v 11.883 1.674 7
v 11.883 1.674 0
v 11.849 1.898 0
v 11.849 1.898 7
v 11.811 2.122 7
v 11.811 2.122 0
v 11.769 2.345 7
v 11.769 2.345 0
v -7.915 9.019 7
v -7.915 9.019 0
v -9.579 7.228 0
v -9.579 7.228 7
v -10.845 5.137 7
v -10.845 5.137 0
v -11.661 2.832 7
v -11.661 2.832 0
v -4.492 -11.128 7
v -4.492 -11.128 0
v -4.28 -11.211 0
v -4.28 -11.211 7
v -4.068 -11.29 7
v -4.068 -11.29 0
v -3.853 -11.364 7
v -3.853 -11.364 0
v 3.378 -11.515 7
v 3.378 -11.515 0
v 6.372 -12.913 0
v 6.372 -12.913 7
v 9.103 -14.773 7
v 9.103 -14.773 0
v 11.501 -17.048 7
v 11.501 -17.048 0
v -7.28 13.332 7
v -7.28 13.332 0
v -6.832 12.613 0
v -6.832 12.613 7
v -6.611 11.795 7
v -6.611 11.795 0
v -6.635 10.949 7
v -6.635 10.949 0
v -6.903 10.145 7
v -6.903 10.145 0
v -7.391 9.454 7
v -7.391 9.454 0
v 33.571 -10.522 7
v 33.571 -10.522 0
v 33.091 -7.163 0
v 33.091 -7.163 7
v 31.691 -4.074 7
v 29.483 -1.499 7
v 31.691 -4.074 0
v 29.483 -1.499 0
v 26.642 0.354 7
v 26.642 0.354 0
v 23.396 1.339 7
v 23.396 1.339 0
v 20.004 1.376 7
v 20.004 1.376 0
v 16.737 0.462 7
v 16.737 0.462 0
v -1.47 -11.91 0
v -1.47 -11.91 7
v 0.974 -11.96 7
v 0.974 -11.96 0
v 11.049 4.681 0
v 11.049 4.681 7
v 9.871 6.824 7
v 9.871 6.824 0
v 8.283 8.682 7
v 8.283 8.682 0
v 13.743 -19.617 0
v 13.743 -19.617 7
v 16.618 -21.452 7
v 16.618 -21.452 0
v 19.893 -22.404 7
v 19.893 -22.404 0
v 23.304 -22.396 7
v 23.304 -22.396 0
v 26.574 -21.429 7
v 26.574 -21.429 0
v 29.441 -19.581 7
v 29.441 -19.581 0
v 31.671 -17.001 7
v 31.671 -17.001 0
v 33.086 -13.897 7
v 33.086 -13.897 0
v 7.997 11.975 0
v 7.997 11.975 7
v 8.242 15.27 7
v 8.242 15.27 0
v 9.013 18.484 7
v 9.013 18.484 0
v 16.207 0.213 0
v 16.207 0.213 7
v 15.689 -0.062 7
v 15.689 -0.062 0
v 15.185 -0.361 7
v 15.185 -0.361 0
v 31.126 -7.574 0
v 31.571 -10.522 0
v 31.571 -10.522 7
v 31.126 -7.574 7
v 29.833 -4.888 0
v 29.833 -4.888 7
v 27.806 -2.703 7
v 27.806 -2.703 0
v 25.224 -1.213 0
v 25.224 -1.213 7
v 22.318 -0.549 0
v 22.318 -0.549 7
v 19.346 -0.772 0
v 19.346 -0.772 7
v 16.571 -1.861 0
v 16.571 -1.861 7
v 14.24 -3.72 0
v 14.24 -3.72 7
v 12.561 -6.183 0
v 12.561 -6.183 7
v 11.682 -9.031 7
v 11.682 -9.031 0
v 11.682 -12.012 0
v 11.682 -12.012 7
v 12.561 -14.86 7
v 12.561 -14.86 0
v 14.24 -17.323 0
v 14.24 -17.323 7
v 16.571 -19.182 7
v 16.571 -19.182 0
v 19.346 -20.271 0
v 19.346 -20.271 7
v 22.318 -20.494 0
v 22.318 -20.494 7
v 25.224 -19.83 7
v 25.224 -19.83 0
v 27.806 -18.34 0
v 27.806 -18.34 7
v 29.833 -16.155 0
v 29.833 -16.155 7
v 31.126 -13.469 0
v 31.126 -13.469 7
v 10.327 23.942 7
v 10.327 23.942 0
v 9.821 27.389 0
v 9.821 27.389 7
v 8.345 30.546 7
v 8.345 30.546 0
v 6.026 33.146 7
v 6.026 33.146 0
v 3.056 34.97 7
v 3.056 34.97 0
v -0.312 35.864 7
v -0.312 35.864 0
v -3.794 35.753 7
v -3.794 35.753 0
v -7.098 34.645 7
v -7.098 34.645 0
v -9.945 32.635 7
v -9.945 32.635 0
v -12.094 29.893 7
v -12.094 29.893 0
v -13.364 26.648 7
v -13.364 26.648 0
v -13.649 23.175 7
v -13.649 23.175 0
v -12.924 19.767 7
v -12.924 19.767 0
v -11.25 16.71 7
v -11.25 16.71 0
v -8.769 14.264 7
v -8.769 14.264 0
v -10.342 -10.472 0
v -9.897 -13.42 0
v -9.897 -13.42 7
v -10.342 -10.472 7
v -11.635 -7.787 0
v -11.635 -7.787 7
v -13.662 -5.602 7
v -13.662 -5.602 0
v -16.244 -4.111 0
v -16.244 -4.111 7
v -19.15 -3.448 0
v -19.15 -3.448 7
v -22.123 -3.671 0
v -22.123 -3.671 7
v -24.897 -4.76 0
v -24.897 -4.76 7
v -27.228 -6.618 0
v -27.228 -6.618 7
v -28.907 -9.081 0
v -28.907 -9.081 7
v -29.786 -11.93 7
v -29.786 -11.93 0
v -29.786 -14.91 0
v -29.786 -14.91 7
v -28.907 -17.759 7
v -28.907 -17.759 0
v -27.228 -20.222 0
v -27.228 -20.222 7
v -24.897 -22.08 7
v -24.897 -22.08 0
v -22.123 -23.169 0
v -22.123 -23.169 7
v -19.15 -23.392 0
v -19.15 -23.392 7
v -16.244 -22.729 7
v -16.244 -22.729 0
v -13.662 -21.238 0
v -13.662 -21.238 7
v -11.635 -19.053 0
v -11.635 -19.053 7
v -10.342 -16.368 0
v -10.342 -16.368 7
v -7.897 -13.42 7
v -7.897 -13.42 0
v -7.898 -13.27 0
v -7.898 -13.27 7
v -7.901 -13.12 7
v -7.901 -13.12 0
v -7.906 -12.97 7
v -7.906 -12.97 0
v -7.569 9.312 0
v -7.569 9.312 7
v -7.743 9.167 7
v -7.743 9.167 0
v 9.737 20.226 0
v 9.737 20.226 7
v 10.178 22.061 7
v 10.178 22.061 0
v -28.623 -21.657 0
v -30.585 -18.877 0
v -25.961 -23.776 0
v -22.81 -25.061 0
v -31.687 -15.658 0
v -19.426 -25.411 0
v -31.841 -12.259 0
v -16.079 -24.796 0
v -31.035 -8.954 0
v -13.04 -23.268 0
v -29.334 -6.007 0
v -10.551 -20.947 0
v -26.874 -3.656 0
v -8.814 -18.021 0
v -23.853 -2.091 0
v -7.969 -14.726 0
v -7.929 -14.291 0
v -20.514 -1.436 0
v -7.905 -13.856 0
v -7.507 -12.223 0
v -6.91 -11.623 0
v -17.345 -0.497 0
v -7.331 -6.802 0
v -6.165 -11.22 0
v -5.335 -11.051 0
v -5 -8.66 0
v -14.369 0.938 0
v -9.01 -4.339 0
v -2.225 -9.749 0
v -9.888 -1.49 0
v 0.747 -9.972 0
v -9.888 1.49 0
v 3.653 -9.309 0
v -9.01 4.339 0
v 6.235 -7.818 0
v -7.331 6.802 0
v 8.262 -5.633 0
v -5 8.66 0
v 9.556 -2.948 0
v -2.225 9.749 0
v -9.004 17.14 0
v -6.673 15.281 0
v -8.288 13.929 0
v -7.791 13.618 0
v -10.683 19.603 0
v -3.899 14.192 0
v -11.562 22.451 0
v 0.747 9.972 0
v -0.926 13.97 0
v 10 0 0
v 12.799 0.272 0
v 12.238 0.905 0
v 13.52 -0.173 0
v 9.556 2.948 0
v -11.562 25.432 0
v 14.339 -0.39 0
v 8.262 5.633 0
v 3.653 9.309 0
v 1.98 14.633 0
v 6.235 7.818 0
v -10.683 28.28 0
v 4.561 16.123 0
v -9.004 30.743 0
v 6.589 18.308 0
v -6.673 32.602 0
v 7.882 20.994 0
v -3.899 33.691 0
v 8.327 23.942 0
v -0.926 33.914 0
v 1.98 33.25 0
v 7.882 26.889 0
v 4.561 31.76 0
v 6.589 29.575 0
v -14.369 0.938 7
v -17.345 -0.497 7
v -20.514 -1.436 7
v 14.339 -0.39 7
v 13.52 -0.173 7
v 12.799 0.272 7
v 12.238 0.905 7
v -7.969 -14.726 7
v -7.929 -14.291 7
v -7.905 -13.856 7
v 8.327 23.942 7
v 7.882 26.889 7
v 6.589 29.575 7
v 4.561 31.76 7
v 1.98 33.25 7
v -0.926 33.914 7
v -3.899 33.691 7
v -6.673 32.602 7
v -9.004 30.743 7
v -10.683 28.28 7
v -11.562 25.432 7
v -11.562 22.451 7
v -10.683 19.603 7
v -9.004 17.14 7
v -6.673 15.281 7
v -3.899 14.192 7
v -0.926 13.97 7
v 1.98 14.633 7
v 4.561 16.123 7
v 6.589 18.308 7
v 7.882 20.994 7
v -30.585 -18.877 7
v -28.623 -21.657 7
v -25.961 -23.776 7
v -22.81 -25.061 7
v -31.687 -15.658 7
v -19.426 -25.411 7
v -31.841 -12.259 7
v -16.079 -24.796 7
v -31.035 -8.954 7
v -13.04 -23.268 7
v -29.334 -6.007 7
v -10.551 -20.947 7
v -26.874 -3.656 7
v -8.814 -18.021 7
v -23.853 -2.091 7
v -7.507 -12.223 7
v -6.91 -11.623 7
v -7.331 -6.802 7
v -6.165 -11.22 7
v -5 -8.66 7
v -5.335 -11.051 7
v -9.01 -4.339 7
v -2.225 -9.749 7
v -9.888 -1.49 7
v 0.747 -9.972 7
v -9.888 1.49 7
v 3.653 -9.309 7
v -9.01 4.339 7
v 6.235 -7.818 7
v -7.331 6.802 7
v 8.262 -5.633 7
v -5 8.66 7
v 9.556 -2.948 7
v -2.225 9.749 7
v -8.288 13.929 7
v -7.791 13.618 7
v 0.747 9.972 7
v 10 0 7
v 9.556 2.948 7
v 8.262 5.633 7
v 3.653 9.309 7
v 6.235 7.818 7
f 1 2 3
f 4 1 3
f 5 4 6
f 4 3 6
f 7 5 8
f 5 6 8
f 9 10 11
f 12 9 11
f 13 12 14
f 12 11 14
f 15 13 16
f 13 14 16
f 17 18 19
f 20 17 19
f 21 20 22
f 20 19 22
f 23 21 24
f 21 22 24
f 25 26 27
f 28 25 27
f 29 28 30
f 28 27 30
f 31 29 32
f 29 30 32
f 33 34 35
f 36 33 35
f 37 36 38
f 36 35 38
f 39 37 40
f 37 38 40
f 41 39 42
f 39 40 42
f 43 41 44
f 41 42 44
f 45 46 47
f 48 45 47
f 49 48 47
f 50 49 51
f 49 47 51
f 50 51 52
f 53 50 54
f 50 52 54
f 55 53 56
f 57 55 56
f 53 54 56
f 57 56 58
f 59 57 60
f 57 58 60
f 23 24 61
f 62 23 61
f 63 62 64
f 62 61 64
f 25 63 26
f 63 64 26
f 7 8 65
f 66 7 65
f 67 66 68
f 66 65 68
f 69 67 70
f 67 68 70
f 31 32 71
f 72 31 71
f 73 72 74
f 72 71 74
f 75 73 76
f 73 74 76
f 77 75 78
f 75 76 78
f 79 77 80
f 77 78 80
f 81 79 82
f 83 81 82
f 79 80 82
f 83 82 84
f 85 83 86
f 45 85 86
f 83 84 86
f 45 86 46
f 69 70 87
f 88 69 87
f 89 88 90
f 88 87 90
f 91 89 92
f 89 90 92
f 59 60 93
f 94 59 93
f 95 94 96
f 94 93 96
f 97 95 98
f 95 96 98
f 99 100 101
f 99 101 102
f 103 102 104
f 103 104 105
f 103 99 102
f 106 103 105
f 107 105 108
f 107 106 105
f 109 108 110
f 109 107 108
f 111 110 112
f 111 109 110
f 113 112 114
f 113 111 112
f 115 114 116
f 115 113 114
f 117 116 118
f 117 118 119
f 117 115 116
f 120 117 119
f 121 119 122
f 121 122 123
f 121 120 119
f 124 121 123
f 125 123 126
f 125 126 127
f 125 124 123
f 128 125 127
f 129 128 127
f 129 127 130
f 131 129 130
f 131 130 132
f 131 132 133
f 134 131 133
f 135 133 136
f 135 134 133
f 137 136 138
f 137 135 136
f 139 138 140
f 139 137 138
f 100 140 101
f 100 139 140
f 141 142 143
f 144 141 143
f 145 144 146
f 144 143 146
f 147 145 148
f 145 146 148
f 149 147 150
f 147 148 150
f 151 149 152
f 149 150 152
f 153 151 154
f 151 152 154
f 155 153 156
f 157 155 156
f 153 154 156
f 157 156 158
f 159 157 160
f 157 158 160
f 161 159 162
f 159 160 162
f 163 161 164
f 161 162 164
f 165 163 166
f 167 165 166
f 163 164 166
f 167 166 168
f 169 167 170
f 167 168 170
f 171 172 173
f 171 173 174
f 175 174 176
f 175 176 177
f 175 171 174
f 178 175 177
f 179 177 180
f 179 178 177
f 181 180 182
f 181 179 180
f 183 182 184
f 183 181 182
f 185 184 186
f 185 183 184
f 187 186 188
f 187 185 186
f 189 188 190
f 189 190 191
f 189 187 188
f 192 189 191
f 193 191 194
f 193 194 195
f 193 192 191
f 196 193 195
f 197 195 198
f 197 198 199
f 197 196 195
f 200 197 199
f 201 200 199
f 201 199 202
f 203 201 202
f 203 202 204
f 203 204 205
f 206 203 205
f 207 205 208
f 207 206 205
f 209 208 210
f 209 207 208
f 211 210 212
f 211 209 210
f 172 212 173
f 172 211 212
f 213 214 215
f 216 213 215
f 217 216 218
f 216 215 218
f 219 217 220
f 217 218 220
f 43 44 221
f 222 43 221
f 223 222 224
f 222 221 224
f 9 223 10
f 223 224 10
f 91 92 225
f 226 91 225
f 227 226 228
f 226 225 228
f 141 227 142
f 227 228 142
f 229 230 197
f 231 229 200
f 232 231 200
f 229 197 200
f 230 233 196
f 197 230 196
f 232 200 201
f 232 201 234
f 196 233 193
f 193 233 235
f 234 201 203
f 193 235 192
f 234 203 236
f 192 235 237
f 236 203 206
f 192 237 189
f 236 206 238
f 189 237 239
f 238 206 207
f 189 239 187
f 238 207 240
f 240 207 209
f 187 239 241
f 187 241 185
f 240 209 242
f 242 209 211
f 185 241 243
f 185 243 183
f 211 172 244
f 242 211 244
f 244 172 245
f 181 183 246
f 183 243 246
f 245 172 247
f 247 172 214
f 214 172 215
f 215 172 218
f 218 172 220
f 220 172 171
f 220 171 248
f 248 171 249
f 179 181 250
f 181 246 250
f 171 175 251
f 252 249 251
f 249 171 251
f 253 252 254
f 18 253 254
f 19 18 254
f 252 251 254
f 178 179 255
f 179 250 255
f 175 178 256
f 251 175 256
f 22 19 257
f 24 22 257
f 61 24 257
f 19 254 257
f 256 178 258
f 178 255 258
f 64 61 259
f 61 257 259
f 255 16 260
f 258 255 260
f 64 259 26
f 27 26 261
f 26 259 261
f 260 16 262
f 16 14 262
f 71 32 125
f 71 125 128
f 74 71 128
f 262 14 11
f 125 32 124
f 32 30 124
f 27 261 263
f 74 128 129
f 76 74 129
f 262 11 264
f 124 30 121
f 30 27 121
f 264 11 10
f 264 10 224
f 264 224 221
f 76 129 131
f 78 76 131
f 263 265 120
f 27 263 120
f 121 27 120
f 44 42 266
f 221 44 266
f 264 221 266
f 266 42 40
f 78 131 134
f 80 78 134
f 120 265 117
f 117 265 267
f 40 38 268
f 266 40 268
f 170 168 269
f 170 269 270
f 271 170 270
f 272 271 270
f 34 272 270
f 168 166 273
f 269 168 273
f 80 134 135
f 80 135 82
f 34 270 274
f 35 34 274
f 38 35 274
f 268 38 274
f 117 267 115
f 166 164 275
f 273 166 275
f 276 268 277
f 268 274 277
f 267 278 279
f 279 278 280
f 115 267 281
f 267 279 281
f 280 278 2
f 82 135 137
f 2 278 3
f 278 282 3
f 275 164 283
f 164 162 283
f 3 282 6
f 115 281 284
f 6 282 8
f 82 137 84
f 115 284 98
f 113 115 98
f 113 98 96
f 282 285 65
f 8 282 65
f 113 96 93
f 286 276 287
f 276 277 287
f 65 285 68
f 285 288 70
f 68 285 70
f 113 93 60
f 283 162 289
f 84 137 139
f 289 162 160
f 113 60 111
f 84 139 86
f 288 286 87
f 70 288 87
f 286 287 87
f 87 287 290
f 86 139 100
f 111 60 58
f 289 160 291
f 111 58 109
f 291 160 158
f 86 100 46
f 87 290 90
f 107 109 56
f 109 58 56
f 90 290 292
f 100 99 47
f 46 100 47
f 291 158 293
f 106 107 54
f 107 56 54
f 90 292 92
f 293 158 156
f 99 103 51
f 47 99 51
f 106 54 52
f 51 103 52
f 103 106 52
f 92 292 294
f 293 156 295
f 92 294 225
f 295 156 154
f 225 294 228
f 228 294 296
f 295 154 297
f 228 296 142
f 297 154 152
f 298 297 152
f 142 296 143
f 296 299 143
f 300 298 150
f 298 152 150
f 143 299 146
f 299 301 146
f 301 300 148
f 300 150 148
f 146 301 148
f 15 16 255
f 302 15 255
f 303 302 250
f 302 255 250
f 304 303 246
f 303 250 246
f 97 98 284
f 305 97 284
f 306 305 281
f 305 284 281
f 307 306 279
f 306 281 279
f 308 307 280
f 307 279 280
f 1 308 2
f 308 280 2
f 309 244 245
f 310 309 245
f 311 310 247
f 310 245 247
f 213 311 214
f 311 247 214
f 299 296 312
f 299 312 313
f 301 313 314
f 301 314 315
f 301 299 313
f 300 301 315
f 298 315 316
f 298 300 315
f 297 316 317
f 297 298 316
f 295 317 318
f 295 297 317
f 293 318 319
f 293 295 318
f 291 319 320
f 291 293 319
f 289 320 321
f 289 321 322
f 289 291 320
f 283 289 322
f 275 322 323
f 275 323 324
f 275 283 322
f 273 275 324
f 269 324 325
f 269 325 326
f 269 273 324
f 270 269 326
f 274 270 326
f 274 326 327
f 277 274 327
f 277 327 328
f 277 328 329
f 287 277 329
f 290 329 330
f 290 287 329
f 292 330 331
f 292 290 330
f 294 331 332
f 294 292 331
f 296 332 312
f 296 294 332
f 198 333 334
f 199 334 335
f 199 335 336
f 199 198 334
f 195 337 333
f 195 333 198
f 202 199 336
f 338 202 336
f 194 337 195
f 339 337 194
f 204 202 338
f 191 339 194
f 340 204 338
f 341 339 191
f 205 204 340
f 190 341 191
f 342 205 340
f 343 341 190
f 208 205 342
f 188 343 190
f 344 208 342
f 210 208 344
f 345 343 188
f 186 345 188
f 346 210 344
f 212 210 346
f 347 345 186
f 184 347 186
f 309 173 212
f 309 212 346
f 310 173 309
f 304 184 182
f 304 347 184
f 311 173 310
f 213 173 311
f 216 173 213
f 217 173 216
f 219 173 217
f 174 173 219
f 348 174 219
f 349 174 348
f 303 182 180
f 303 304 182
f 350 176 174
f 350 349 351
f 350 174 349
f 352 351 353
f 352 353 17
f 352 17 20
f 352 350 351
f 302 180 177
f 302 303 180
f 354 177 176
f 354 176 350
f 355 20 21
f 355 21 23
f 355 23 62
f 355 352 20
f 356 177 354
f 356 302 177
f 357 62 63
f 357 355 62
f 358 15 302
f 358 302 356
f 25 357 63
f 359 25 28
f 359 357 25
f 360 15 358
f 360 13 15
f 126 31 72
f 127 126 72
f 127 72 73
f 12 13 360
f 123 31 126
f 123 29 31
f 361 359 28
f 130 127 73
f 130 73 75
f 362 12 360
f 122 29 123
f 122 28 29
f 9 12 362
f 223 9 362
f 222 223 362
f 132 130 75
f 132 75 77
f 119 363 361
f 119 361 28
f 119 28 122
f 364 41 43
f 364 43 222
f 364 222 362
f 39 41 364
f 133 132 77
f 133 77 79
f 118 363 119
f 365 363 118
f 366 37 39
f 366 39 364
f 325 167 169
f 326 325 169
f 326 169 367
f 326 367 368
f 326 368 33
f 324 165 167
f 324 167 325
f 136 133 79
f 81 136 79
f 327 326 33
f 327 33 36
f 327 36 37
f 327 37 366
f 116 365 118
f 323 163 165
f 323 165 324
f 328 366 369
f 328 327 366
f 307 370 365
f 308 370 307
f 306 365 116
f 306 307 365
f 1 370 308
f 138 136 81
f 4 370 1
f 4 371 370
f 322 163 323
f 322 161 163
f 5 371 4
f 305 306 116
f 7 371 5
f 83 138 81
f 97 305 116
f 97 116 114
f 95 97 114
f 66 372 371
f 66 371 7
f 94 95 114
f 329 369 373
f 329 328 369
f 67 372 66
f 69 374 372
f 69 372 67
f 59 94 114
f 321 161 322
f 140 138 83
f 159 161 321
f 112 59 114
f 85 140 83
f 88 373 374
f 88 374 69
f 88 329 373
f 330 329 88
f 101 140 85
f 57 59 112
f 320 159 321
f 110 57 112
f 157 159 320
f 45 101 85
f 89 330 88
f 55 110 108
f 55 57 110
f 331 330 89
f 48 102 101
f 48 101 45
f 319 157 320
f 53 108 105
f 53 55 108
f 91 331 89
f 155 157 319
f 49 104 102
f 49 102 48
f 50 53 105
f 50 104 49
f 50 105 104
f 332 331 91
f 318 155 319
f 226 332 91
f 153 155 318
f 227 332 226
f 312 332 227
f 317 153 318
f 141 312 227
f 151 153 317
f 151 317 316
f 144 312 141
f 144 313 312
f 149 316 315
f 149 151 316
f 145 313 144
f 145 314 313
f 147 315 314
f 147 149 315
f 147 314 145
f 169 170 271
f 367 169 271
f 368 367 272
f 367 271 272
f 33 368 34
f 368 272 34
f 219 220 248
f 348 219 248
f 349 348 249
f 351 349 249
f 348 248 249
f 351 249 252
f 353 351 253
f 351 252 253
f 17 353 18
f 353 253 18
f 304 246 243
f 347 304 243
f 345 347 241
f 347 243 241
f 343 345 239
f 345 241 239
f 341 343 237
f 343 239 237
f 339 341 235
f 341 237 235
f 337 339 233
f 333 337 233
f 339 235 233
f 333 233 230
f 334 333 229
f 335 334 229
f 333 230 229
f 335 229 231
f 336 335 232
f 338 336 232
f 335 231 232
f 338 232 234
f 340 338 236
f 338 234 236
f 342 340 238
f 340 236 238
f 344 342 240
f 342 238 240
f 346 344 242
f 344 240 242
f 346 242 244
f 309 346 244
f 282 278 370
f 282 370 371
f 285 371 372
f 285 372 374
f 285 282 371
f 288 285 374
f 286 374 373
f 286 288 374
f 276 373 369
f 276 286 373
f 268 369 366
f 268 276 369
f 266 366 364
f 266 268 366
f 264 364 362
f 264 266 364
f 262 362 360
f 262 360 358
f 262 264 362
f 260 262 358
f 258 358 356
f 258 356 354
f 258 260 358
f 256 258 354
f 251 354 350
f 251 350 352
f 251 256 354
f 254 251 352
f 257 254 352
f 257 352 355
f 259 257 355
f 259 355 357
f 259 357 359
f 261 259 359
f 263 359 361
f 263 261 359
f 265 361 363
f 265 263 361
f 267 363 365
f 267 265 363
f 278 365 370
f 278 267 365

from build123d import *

# Parameters (mm, degrees)
F0_R     = 10
F1_DEPTH = 7
F2_DEPTH = 7


with BuildPart() as f1:
    # F0 (on Top) → F1 (new body)
    with BuildSketch(Plane.XY):
        with BuildLine():
            ThreePointArc((-7.905729, -12.970181), (-8.489375, -9.697228), (-9.948647, -6.710024))
            ThreePointArc((-9.948647, -6.710024), (-14.537703, -2.683439), (-20.514029, -1.435908))
            ThreePointArc((-20.514029, -1.435908), (-28.623409, -21.657457), (-7.968535, -14.725697))
            ThreePointArc((-7.968535, -14.725697), (-8.073222, -13.84307), (-7.905729, -12.970181))
        make_face()
        with Locations((-19.897294, -13.420049)):
            Circle(F0_R, mode=Mode.SUBTRACT)
        with BuildLine():
            ThreePointArc((11.882649, 1.674113), (11.805899, 2.006216), (11.768638, 2.34503))
            ThreePointArc((11.768638, 2.34503), (10.514847, 5.78256), (8.283423, 8.682448))
            ThreePointArc((8.283423, 8.682448), (4.070211, 11.288639), (-0.836728, 11.970793))
            ThreePointArc((-0.836728, 11.970793), (-4.302154, 11.202297), (-7.391149, 9.453619))
            ThreePointArc((-7.391149, 9.453619), (-7.640384, 9.2211), (-7.915175, 9.019424))
            ThreePointArc((-7.915175, 9.019424), (-10.265267, 6.214844), (-11.660932, 2.832431))
            ThreePointArc((-11.660932, 2.832431), (-11.811354, -2.119413), (-9.948647, -6.710024))
            ThreePointArc((-9.948647, -6.710024), (-7.550397, -9.326923), (-4.4915, -11.127732))
            ThreePointArc((-4.4915, -11.127732), (-4.165515, -11.227317), (-3.853463, -11.364454))
            ThreePointArc((-3.853463, -11.364454), (-0.24958, -11.997404), (3.377509, -11.514879))
            ThreePointArc((3.377509, -11.514879), (7.741143, -9.169226), (10.785375, -5.260768))
            ThreePointArc((10.785375, -5.260768), (11.692401, -2.699583), (12, 0))
            ThreePointArc((12, 0), (11.970626, 0.839111), (11.882649, 1.674113))
        make_face()
        Circle(F0_R, mode=Mode.SUBTRACT)
        with BuildLine():
            ThreePointArc((-9.948647, -6.710024), (-11.811354, -2.119413), (-11.660932, 2.832431))
            ThreePointArc((-11.660932, 2.832431), (-15.828168, 0.160413), (-20.514029, -1.435908))
            ThreePointArc((-20.514029, -1.435908), (-14.537703, -2.683439), (-9.948647, -6.710024))
        make_face()
    extrude(amount=F1_DEPTH)

    # F0 (on Top) → F2 (join)
    with BuildSketch(Plane.XY):
        with BuildLine():
            ThreePointArc((11.882649, 1.674113), (11.805899, 2.006216), (11.768638, 2.34503))
            ThreePointArc((11.768638, 2.34503), (10.514847, 5.78256), (8.283423, 8.682448))
            ThreePointArc((8.283423, 8.682448), (4.070211, 11.288639), (-0.836728, 11.970793))
            ThreePointArc((-0.836728, 11.970793), (-4.302154, 11.202297), (-7.391149, 9.453619))
            ThreePointArc((-7.391149, 9.453619), (-7.640384, 9.2211), (-7.915175, 9.019424))
            ThreePointArc((-7.915175, 9.019424), (-10.265267, 6.214844), (-11.660932, 2.832431))
            ThreePointArc((-11.660932, 2.832431), (-11.811354, -2.119413), (-9.948647, -6.710024))
            ThreePointArc((-9.948647, -6.710024), (-7.550397, -9.326923), (-4.4915, -11.127732))
            ThreePointArc((-4.4915, -11.127732), (-4.165515, -11.227317), (-3.853463, -11.364454))
            ThreePointArc((-3.853463, -11.364454), (-0.24958, -11.997404), (3.377509, -11.514879))
            ThreePointArc((3.377509, -11.514879), (7.741143, -9.169226), (10.785375, -5.260768))
            ThreePointArc((10.785375, -5.260768), (11.692401, -2.699583), (12, 0))
            ThreePointArc((12, 0), (11.970626, 0.839111), (11.882649, 1.674113))
        make_face()
        Circle(F0_R, mode=Mode.SUBTRACT)
        with BuildLine():
            ThreePointArc((11.882649, 1.674113), (11.8304, 2.01038), (11.768638, 2.34503))
            ThreePointArc((11.768638, 2.34503), (11.805899, 2.006216), (11.882649, 1.674113))
        make_face()
        with BuildLine():
            ThreePointArc((-0.836728, 11.970793), (4.070211, 11.288639), (8.283423, 8.682448))
            ThreePointArc((8.283423, 8.682448), (8.053006, 13.627389), (9.013482, 18.483624))
            ThreePointArc((9.013482, 18.483624), (4.944925, 13.931739), (-0.836728, 11.970793))
        make_face()
        with BuildLine():
            ThreePointArc((15.185371, -0.361472), (13.143603, 0.022889), (11.882649, 1.674113))
            ThreePointArc((11.882649, 1.674113), (11.970626, 0.839111), (12, 0))
            ThreePointArc((12, 0), (11.692401, -2.699583), (10.785375, -5.260768))
            ThreePointArc((10.785375, -5.260768), (12.642734, -2.5034), (15.185371, -0.361472))
        make_face()
        with BuildLine():
            ThreePointArc((-7.391149, 9.453619), (-4.302154, 11.202297), (-0.836728, 11.970793))
            ThreePointArc((-0.836728, 11.970793), (-4.153358, 12.200628), (-7.279641, 13.331653))
            ThreePointArc((-7.279641, 13.331653), (-6.591624, 11.37125), (-7.391149, 9.453619))
        make_face()
        with BuildLine():
            ThreePointArc((-7.279641, 13.331653), (-4.153358, 12.200628), (-0.836728, 11.970793))
            ThreePointArc((-0.836728, 11.970793), (4.944925, 13.931739), (9.013482, 18.483624))
            ThreePointArc((9.013482, 18.483624), (9.993661, 21.134743), (10.326544, 23.941586))
            ThreePointArc((10.326544, 23.941586), (-7.098341, 34.645353), (-8.768561, 14.263803))
            ThreePointArc((-8.768561, 14.263803), (-7.951839, 13.913151), (-7.279641, 13.331653))
        make_face()
        with Locations((-1.673456, 23.941586)):
            Circle(F0_R, mode=Mode.SUBTRACT)
        with BuildLine():
            ThreePointArc((16.737096, 0.461895), (16.025062, -0.07008), (15.185371, -0.361472))
            ThreePointArc((15.185371, -0.361472), (12.642734, -2.5034), (10.785375, -5.260768))
            ThreePointArc((10.785375, -5.260768), (9.592778, -11.248299), (11.500547, -17.047716))
            ThreePointArc((11.500547, -17.047716), (24.973511, -22.028979), (33.57075, -10.521537))
            ThreePointArc((33.57075, -10.521537), (28.128042, -0.471566), (16.737096, 0.461895))
        make_face()
        with Locations((21.57075, -10.521537)):
            Circle(F0_R, mode=Mode.SUBTRACT)
        with BuildLine():
            ThreePointArc((16.737096, 0.461895), (15.946147, 0.078644), (15.185371, -0.361472))
            ThreePointArc((15.185371, -0.361472), (16.025062, -0.07008), (16.737096, 0.461895))
        make_face()
        with BuildLine():
            ThreePointArc((-7.915175, 9.019424), (-7.640384, 9.2211), (-7.391149, 9.453619))
            ThreePointArc((-7.391149, 9.453619), (-7.65624, 9.240237), (-7.915175, 9.019424))
        make_face()
        with BuildLine():
            ThreePointArc((-8.768561, 14.263803), (-8.041181, 13.770446), (-7.279641, 13.331653))
            ThreePointArc((-7.279641, 13.331653), (-7.951839, 13.913151), (-8.768561, 14.263803))
        make_face()
        with BuildLine():
            ThreePointArc((11.500547, -17.047716), (9.592778, -11.248299), (10.785375, -5.260768))
            ThreePointArc((10.785375, -5.260768), (7.741143, -9.169226), (3.377509, -11.514879))
            ThreePointArc((3.377509, -11.514879), (7.775162, -13.787802), (11.500547, -17.047716))
        make_face()
        with BuildLine():
            ThreePointArc((-9.948647, -6.710024), (-11.811354, -2.119413), (-11.660932, 2.832431))
            ThreePointArc((-11.660932, 2.832431), (-15.828168, 0.160413), (-20.514029, -1.435908))
            ThreePointArc((-20.514029, -1.435908), (-14.537703, -2.683439), (-9.948647, -6.710024))
        make_face()
        with BuildLine():
            ThreePointArc((-4.4915, -11.127732), (-4.17416, -11.250617), (-3.853463, -11.364454))
            ThreePointArc((-3.853463, -11.364454), (-4.165515, -11.227317), (-4.4915, -11.127732))
        make_face()
        with BuildLine():
            ThreePointArc((-4.4915, -11.127732), (-7.550397, -9.326923), (-9.948647, -6.710024))
            ThreePointArc((-9.948647, -6.710024), (-8.489375, -9.697228), (-7.905729, -12.970181))
            ThreePointArc((-7.905729, -12.970181), (-6.551979, -11.394139), (-4.4915, -11.127732))
        make_face()
        with BuildLine():
            ThreePointArc((-7.905729, -12.970181), (-8.489375, -9.697228), (-9.948647, -6.710024))
            ThreePointArc((-9.948647, -6.710024), (-14.537703, -2.683439), (-20.514029, -1.435908))
            ThreePointArc((-20.514029, -1.435908), (-28.623409, -21.657457), (-7.968535, -14.725697))
            ThreePointArc((-7.968535, -14.725697), (-8.073222, -13.84307), (-7.905729, -12.970181))
        make_face()
        with Locations((-19.897294, -13.420049)):
            Circle(F0_R, mode=Mode.SUBTRACT)
        with BuildLine():
            ThreePointArc((-7.897294, -13.420049), (-7.899403, -13.195075), (-7.905729, -12.970181))
            ThreePointArc((-7.905729, -12.970181), (-8.073222, -13.84307), (-7.968535, -14.725697))
            ThreePointArc((-7.968535, -14.725697), (-7.915117, -14.073844), (-7.897294, -13.420049))
        make_face()
    extrude(amount=F2_DEPTH)


solid = f1.part
